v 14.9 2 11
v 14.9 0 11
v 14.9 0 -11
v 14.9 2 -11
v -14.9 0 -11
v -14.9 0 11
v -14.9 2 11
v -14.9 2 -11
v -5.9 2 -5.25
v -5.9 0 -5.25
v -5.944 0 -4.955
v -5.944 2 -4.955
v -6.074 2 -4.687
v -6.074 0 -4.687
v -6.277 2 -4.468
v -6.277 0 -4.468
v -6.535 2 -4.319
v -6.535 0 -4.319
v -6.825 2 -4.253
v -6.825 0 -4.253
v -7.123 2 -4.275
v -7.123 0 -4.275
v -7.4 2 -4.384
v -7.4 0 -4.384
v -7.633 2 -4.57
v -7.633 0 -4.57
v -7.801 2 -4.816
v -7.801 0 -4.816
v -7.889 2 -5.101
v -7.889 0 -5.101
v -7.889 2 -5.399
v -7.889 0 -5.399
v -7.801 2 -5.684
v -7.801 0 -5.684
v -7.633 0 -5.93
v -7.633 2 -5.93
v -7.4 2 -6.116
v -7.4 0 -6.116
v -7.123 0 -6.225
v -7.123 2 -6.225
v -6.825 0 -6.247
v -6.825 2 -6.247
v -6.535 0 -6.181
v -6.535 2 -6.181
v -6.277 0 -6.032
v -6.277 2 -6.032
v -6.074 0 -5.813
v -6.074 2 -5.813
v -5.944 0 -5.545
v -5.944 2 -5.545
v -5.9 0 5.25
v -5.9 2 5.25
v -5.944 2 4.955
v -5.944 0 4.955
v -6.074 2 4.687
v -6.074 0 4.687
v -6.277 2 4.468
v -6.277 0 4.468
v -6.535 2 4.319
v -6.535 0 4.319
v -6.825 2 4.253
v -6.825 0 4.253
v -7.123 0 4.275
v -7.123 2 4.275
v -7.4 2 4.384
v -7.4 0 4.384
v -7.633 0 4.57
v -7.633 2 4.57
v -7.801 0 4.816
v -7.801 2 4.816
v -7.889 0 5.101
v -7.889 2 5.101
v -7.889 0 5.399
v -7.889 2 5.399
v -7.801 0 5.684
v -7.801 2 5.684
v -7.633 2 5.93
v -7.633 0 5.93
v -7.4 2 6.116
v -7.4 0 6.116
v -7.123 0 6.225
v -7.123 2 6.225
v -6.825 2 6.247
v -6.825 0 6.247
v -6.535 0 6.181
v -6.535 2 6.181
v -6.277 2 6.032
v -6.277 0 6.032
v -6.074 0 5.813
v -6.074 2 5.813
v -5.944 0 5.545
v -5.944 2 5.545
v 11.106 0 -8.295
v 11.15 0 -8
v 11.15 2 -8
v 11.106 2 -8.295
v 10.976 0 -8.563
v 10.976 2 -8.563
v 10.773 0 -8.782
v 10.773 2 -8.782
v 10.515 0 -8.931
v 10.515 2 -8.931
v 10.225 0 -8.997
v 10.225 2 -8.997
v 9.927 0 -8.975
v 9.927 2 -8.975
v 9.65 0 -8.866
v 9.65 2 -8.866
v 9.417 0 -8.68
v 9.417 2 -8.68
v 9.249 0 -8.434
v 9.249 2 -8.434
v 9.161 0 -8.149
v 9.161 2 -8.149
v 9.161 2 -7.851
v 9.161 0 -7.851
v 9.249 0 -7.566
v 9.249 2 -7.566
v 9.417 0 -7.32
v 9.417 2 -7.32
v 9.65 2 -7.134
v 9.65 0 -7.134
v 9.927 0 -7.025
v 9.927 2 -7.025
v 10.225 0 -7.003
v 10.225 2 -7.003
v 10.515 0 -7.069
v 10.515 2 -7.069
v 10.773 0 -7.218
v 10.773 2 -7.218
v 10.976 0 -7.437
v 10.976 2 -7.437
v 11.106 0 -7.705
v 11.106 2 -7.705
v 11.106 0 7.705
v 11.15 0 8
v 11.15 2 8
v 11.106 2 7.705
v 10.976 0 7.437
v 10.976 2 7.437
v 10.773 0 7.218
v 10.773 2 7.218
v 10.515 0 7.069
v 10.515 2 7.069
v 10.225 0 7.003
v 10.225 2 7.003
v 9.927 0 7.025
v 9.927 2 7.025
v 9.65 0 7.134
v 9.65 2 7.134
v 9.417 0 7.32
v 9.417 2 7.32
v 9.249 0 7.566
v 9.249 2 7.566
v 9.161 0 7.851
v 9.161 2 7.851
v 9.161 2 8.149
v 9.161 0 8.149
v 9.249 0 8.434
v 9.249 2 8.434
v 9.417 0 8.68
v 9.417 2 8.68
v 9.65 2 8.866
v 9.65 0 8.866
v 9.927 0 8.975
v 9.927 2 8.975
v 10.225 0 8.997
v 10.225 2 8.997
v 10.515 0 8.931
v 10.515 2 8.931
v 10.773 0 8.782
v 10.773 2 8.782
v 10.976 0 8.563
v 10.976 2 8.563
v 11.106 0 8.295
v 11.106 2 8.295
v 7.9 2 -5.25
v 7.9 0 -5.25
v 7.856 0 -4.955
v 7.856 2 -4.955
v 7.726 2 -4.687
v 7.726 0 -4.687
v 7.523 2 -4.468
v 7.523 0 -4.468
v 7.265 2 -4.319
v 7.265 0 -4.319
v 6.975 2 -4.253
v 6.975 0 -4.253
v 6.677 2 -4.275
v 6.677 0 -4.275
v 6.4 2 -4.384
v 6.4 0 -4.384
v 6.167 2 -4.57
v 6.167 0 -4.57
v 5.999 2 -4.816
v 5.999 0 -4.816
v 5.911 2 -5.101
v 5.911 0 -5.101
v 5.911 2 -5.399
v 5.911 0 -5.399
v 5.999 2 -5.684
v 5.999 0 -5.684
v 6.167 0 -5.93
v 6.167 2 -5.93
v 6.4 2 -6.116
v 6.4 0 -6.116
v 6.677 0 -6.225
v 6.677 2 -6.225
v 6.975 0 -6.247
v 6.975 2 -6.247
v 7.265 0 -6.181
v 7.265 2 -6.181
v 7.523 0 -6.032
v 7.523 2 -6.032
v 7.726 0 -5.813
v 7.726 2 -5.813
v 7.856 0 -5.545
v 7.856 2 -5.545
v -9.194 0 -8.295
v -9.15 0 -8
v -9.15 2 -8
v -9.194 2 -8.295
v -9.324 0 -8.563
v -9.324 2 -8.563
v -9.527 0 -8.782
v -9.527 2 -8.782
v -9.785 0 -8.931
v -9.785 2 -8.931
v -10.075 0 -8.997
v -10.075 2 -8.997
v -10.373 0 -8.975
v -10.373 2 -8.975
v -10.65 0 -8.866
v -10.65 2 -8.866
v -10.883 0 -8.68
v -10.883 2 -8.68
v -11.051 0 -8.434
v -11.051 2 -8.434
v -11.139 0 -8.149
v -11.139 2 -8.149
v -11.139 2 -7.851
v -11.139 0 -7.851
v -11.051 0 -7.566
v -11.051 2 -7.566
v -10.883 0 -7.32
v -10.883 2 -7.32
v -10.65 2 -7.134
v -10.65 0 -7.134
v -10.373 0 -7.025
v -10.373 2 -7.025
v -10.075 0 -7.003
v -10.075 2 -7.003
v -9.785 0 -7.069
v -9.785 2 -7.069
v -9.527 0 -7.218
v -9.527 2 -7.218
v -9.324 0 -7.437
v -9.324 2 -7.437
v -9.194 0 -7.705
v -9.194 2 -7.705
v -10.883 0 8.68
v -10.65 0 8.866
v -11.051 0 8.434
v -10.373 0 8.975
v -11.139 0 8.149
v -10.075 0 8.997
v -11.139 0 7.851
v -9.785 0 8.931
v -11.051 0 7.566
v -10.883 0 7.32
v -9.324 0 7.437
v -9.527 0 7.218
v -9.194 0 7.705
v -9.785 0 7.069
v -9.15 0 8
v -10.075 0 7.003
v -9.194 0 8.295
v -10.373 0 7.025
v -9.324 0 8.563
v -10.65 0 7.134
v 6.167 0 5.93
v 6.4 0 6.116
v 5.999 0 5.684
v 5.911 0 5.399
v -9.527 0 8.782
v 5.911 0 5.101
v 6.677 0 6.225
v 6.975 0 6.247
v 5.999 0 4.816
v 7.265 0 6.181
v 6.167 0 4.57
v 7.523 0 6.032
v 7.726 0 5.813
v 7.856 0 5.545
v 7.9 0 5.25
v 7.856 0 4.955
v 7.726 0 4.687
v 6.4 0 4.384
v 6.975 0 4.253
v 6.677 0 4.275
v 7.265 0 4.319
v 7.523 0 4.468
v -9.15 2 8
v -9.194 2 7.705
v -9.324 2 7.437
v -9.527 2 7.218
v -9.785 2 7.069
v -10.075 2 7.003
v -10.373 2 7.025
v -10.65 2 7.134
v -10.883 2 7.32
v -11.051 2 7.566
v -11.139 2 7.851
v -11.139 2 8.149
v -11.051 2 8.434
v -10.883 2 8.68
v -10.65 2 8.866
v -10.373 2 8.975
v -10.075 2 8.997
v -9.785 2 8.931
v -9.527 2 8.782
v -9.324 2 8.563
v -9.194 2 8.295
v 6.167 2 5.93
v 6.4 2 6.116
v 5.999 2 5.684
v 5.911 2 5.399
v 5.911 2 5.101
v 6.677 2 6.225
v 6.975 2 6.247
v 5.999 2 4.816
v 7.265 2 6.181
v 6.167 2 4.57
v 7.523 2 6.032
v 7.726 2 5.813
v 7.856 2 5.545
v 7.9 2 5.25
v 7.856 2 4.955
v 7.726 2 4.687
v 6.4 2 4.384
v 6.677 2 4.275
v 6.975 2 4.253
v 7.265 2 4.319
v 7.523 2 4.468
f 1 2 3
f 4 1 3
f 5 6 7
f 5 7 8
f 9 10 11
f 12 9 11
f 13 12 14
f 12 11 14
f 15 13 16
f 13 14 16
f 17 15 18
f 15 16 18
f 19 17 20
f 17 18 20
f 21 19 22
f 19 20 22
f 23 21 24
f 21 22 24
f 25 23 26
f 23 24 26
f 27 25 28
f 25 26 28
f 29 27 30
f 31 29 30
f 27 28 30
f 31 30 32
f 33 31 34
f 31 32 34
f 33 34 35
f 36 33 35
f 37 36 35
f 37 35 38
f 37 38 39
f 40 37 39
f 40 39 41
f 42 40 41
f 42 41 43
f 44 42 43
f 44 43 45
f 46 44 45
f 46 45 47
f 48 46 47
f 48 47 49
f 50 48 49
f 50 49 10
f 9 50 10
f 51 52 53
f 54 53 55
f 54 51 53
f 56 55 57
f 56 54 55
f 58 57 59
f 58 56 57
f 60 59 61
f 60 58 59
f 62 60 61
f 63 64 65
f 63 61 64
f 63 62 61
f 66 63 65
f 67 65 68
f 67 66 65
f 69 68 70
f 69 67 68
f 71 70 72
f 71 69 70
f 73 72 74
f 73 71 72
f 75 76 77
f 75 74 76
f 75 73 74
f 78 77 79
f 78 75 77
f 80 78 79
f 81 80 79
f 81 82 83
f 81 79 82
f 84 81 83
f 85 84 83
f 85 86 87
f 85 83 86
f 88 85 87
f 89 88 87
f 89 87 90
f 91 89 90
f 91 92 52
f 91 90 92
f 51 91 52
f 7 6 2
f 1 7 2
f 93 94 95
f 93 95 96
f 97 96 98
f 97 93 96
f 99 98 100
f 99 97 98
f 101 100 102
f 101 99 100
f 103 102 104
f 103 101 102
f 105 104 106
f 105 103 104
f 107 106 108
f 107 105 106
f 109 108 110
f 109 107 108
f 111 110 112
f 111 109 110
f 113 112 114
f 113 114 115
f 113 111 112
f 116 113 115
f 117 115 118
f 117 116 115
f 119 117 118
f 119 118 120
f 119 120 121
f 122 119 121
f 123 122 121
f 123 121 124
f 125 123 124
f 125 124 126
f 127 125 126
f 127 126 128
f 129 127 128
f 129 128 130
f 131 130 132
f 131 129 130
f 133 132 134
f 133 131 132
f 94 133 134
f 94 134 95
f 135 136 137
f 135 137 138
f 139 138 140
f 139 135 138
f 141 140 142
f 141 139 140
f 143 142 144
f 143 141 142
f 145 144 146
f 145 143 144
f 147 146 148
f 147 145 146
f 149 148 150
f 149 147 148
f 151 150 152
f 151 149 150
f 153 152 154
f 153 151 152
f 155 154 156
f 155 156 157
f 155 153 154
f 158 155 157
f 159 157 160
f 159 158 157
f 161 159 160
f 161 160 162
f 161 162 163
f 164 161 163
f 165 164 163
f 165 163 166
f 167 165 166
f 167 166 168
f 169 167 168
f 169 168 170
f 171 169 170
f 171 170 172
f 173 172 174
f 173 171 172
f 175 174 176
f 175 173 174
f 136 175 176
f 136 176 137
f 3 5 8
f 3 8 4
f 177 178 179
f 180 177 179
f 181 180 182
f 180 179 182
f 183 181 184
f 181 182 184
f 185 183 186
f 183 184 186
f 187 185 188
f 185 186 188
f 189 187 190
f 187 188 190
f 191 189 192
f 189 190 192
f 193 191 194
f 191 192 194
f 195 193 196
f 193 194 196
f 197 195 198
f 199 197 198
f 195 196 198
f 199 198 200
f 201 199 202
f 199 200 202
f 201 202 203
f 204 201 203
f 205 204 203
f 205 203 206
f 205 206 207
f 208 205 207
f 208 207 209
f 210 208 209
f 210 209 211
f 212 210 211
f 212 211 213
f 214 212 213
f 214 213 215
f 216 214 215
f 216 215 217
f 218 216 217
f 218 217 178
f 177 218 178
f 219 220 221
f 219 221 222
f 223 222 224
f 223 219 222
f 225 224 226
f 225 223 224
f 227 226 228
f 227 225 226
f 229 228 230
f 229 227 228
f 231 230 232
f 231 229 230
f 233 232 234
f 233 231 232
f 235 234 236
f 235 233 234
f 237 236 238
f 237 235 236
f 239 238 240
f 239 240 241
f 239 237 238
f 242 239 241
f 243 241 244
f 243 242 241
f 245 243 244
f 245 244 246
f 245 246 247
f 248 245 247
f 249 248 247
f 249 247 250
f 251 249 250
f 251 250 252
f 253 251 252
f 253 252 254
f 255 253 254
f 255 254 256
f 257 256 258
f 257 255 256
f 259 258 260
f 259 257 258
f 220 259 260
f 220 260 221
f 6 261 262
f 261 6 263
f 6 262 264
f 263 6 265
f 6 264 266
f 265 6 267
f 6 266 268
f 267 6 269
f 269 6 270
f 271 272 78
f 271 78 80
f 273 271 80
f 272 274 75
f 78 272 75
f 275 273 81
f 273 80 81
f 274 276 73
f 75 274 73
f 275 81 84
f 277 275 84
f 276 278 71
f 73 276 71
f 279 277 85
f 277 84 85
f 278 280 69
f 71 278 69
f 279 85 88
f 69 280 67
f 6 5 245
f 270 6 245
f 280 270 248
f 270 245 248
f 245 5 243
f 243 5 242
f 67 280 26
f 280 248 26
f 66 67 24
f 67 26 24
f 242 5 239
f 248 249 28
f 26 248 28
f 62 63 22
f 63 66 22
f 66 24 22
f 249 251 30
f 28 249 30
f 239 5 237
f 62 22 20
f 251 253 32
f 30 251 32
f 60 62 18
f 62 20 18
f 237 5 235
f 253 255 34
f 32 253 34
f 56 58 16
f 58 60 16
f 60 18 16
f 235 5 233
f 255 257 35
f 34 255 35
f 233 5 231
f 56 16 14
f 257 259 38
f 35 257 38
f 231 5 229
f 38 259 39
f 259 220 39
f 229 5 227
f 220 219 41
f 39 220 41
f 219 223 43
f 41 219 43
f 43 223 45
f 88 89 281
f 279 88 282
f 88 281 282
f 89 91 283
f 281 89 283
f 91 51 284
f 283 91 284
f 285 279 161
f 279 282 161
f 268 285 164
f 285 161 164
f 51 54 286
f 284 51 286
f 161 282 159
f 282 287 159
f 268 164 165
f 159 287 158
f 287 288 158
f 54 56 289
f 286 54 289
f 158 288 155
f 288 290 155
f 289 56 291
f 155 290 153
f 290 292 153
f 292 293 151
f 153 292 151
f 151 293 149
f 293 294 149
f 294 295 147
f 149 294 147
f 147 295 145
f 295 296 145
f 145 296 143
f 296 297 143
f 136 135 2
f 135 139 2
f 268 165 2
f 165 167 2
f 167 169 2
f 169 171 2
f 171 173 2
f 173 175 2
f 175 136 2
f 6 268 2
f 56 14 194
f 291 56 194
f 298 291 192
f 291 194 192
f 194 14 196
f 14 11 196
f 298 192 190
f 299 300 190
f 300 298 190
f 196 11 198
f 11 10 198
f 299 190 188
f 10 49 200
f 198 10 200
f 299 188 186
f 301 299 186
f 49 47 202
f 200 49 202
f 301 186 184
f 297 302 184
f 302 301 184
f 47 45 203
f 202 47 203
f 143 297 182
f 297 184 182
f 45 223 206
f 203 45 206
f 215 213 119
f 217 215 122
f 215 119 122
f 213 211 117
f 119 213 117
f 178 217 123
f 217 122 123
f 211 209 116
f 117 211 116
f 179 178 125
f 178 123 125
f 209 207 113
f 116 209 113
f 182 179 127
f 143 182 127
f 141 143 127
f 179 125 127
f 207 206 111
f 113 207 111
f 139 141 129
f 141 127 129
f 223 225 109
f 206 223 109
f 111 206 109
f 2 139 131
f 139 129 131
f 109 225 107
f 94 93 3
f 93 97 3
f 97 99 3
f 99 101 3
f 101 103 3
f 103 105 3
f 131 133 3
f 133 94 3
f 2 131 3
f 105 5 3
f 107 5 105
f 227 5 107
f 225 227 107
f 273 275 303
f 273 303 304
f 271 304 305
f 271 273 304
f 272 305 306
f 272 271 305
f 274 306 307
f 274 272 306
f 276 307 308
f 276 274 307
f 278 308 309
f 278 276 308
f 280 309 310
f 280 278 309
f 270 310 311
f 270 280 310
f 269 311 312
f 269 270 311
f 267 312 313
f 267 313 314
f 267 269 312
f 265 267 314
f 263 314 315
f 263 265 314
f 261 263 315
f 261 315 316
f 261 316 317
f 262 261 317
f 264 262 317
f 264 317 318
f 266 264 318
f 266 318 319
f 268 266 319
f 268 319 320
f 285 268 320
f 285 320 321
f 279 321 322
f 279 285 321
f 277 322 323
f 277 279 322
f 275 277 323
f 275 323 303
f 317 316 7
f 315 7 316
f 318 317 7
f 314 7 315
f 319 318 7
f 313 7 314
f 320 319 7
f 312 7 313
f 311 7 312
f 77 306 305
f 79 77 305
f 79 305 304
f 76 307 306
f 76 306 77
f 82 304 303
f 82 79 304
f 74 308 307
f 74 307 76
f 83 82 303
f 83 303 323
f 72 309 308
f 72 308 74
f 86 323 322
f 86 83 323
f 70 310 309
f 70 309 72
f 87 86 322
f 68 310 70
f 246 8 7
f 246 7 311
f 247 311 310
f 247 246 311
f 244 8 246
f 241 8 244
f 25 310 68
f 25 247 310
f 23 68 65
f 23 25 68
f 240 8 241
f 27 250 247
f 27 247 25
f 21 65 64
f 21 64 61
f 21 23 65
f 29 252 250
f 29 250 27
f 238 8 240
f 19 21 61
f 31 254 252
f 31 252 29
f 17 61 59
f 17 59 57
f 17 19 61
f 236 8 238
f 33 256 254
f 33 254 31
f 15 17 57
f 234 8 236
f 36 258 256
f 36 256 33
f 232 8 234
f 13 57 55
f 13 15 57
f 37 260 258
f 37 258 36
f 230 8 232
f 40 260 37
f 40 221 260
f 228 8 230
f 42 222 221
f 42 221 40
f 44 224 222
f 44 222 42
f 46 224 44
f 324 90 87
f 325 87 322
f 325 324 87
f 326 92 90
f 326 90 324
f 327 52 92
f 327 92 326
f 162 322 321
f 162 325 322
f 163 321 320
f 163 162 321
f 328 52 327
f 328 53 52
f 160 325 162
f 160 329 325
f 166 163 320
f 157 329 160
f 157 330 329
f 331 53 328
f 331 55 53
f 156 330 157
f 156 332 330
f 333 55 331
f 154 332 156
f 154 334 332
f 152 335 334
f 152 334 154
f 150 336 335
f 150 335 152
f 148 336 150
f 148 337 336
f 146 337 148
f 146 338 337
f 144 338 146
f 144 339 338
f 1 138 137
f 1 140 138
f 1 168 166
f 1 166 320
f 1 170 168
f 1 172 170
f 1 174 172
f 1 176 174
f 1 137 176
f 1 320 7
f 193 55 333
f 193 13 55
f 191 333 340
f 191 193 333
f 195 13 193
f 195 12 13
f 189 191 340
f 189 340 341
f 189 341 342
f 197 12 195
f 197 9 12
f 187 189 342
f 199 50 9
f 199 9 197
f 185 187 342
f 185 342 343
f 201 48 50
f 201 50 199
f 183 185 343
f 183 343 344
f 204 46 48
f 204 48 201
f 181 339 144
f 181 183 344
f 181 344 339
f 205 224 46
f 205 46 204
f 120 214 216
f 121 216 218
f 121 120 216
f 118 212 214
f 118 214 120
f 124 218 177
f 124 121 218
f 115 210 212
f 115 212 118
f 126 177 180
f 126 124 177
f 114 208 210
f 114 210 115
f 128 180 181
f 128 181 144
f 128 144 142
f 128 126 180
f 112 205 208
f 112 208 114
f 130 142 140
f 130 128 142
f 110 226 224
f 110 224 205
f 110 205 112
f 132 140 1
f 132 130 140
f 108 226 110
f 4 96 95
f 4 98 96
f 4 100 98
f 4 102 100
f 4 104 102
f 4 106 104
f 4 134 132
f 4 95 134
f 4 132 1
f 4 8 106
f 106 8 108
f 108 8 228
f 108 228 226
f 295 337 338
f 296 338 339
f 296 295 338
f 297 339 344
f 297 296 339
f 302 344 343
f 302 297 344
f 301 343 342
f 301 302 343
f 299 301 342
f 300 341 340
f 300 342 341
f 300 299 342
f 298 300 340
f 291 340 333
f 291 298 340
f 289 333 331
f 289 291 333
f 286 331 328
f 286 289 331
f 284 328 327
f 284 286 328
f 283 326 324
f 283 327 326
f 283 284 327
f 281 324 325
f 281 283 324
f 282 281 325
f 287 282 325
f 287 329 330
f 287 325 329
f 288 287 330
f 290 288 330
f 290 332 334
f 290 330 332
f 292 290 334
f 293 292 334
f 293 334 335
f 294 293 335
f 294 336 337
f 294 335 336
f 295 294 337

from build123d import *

# Parameters (mm, degrees)
SKETCH1_W           = 29.8
SKETCH1_H           = 22
SKETCH1_R           = 1
BOSS_EXTRUDE1_DEPTH = 2
SKETCH2_R           = 1
CUT_EXTRUDE1_DEPTH  = 10


with BuildPart() as part:
    # Sketch1 → Boss-Extrude1 (new body)
    with BuildSketch(Plane(origin=(0, 0, 0), x_dir=(1, 0, 0), z_dir=(0, 1, 0))):
        Rectangle(SKETCH1_W, SKETCH1_H)
        with Locations((10.15, 8)):
            Circle(SKETCH1_R, mode=Mode.SUBTRACT)
        with Locations((10.15, -8)):
            Circle(SKETCH1_R, mode=Mode.SUBTRACT)
        with Locations((-10.15, -8)):
            Circle(SKETCH1_R, mode=Mode.SUBTRACT)
        with Locations((-10.15, 8)):
            Circle(SKETCH1_R, mode=Mode.SUBTRACT)
    extrude(amount=BOSS_EXTRUDE1_DEPTH)

    # Sketch2 → Cut-Extrude1 (cut)
    with BuildSketch(Plane.XZ):
        with Locations((6.9, -5.25)):
            Circle(SKETCH2_R)
        with Locations((-6.9, -5.25)):
            Circle(SKETCH2_R)
    cut_extrude1 = extrude(amount=-CUT_EXTRUDE1_DEPTH, mode=Mode.SUBTRACT)

    # Mirror1: Cut-Extrude1 across plane
    add(cut_extrude1.mirror(Plane(origin=(0, 0, 0), x_dir=(1, 0, 0), z_dir=(0, 0, -1))), mode=Mode.SUBTRACT)


solid = part.part
